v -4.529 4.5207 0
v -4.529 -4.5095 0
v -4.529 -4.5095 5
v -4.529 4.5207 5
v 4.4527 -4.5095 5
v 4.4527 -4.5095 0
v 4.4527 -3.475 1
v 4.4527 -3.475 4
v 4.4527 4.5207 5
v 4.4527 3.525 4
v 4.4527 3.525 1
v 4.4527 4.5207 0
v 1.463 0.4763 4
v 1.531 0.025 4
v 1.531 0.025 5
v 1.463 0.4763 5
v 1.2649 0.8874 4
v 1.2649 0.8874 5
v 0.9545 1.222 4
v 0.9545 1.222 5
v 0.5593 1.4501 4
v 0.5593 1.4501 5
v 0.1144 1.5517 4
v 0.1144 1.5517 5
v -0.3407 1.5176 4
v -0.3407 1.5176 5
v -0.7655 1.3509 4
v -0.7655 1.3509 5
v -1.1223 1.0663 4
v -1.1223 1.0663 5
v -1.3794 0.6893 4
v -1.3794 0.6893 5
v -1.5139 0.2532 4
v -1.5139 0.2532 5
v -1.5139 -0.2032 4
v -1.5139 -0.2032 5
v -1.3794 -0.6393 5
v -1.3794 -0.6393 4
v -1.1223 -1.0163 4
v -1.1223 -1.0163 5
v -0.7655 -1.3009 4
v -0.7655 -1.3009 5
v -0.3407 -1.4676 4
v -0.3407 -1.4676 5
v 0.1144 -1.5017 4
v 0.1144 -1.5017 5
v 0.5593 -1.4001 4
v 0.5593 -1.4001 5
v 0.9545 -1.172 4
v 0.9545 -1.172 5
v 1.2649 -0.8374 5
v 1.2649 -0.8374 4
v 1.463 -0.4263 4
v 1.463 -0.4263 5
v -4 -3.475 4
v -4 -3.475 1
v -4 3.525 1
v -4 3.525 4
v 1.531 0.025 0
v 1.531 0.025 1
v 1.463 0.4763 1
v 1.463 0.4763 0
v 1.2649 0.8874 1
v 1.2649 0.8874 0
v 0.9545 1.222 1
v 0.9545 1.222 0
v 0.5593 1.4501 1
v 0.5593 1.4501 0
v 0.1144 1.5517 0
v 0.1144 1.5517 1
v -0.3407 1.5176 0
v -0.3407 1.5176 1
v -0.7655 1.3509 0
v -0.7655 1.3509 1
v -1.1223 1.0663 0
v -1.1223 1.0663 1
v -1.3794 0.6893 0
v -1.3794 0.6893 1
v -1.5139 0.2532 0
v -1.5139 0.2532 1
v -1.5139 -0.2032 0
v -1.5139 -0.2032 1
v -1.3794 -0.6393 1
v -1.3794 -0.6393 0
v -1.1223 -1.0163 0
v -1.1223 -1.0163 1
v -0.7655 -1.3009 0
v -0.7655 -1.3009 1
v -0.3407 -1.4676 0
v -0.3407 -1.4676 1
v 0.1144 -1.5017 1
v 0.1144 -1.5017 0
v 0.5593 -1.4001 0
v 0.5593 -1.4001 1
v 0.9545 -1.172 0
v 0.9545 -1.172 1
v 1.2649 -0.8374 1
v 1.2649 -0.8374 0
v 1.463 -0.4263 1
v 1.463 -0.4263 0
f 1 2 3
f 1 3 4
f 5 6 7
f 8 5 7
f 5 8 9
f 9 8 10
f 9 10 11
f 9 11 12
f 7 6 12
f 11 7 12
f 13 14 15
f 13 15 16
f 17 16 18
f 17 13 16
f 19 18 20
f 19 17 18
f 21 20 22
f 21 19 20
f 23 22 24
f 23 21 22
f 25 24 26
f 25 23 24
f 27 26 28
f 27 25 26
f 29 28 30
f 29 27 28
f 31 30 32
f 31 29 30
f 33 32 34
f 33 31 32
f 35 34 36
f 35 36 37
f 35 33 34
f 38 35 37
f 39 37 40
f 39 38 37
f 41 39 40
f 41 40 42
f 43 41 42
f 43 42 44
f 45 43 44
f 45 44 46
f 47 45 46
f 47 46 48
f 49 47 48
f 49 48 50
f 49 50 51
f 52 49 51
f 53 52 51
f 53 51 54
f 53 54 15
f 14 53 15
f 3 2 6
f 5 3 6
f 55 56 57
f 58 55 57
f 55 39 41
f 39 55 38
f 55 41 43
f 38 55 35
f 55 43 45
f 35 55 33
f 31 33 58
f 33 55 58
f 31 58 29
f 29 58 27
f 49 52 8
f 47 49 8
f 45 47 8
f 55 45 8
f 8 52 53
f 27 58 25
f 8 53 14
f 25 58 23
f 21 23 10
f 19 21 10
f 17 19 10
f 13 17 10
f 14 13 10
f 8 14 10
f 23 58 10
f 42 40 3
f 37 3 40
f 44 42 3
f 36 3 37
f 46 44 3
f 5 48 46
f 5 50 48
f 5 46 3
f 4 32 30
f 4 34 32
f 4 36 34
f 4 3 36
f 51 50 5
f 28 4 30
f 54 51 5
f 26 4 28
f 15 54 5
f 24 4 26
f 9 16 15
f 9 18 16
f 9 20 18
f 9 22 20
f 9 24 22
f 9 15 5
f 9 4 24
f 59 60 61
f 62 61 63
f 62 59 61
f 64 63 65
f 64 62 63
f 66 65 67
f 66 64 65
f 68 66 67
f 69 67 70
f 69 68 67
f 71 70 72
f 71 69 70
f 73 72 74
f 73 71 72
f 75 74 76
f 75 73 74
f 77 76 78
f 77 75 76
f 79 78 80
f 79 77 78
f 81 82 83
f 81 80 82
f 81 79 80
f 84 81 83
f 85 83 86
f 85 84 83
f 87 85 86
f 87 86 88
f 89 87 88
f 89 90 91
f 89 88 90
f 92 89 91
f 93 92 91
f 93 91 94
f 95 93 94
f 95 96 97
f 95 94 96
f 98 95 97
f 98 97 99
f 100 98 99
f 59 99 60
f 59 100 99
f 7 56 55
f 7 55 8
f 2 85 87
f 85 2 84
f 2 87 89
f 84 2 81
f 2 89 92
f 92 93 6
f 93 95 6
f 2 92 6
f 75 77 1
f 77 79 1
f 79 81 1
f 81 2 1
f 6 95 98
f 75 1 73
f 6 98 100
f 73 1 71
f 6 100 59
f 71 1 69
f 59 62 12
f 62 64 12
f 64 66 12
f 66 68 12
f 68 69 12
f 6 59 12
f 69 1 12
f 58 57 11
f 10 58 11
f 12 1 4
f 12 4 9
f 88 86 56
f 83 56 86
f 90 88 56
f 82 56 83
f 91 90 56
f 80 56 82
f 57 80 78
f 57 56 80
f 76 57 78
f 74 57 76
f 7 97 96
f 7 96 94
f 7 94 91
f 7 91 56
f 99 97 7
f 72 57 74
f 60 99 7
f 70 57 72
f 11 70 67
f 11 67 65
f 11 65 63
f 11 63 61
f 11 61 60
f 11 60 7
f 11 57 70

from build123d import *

# Parameters (mm, degrees)
BOX001_W     = 9.5
BOX001_H     = 7
BOX001_DEPTH = 3
SKETCH_W     = 8.981727
SKETCH_H     = 9.030207
SKETCH_R     = 1.530969
PAD_DEPTH    = 5


with BuildPart() as body044:
    # Box001 → Box001 (new body)
    with BuildSketch(Plane.XY):
        with Locations((4.75, 3.5)):
            Rectangle(BOX001_W, BOX001_H)
    extrude(amount=BOX001_DEPTH)


with BuildPart() as body044_1:
    # Body044 placement: moved
    add(body044.part.moved(Location((-4, -3.5, 1))))


with BuildPart() as cut005:
    # Sketch → Pad (new body)
    with BuildSketch(Plane.XY):
        with Locations((-0.03812, -0.019445)):
            Rectangle(SKETCH_W, SKETCH_H)
        Circle(SKETCH_R, mode=Mode.SUBTRACT)
    extrude(amount=PAD_DEPTH)

    # Cut005: cut Body044
    add(body044_1.part, mode=Mode.SUBTRACT)


with BuildPart() as cut005_1:
    # Cut005 placement: moved
    add(cut005.part.moved(Location((0, 0.025, 0))))


solid = cut005_1.part
